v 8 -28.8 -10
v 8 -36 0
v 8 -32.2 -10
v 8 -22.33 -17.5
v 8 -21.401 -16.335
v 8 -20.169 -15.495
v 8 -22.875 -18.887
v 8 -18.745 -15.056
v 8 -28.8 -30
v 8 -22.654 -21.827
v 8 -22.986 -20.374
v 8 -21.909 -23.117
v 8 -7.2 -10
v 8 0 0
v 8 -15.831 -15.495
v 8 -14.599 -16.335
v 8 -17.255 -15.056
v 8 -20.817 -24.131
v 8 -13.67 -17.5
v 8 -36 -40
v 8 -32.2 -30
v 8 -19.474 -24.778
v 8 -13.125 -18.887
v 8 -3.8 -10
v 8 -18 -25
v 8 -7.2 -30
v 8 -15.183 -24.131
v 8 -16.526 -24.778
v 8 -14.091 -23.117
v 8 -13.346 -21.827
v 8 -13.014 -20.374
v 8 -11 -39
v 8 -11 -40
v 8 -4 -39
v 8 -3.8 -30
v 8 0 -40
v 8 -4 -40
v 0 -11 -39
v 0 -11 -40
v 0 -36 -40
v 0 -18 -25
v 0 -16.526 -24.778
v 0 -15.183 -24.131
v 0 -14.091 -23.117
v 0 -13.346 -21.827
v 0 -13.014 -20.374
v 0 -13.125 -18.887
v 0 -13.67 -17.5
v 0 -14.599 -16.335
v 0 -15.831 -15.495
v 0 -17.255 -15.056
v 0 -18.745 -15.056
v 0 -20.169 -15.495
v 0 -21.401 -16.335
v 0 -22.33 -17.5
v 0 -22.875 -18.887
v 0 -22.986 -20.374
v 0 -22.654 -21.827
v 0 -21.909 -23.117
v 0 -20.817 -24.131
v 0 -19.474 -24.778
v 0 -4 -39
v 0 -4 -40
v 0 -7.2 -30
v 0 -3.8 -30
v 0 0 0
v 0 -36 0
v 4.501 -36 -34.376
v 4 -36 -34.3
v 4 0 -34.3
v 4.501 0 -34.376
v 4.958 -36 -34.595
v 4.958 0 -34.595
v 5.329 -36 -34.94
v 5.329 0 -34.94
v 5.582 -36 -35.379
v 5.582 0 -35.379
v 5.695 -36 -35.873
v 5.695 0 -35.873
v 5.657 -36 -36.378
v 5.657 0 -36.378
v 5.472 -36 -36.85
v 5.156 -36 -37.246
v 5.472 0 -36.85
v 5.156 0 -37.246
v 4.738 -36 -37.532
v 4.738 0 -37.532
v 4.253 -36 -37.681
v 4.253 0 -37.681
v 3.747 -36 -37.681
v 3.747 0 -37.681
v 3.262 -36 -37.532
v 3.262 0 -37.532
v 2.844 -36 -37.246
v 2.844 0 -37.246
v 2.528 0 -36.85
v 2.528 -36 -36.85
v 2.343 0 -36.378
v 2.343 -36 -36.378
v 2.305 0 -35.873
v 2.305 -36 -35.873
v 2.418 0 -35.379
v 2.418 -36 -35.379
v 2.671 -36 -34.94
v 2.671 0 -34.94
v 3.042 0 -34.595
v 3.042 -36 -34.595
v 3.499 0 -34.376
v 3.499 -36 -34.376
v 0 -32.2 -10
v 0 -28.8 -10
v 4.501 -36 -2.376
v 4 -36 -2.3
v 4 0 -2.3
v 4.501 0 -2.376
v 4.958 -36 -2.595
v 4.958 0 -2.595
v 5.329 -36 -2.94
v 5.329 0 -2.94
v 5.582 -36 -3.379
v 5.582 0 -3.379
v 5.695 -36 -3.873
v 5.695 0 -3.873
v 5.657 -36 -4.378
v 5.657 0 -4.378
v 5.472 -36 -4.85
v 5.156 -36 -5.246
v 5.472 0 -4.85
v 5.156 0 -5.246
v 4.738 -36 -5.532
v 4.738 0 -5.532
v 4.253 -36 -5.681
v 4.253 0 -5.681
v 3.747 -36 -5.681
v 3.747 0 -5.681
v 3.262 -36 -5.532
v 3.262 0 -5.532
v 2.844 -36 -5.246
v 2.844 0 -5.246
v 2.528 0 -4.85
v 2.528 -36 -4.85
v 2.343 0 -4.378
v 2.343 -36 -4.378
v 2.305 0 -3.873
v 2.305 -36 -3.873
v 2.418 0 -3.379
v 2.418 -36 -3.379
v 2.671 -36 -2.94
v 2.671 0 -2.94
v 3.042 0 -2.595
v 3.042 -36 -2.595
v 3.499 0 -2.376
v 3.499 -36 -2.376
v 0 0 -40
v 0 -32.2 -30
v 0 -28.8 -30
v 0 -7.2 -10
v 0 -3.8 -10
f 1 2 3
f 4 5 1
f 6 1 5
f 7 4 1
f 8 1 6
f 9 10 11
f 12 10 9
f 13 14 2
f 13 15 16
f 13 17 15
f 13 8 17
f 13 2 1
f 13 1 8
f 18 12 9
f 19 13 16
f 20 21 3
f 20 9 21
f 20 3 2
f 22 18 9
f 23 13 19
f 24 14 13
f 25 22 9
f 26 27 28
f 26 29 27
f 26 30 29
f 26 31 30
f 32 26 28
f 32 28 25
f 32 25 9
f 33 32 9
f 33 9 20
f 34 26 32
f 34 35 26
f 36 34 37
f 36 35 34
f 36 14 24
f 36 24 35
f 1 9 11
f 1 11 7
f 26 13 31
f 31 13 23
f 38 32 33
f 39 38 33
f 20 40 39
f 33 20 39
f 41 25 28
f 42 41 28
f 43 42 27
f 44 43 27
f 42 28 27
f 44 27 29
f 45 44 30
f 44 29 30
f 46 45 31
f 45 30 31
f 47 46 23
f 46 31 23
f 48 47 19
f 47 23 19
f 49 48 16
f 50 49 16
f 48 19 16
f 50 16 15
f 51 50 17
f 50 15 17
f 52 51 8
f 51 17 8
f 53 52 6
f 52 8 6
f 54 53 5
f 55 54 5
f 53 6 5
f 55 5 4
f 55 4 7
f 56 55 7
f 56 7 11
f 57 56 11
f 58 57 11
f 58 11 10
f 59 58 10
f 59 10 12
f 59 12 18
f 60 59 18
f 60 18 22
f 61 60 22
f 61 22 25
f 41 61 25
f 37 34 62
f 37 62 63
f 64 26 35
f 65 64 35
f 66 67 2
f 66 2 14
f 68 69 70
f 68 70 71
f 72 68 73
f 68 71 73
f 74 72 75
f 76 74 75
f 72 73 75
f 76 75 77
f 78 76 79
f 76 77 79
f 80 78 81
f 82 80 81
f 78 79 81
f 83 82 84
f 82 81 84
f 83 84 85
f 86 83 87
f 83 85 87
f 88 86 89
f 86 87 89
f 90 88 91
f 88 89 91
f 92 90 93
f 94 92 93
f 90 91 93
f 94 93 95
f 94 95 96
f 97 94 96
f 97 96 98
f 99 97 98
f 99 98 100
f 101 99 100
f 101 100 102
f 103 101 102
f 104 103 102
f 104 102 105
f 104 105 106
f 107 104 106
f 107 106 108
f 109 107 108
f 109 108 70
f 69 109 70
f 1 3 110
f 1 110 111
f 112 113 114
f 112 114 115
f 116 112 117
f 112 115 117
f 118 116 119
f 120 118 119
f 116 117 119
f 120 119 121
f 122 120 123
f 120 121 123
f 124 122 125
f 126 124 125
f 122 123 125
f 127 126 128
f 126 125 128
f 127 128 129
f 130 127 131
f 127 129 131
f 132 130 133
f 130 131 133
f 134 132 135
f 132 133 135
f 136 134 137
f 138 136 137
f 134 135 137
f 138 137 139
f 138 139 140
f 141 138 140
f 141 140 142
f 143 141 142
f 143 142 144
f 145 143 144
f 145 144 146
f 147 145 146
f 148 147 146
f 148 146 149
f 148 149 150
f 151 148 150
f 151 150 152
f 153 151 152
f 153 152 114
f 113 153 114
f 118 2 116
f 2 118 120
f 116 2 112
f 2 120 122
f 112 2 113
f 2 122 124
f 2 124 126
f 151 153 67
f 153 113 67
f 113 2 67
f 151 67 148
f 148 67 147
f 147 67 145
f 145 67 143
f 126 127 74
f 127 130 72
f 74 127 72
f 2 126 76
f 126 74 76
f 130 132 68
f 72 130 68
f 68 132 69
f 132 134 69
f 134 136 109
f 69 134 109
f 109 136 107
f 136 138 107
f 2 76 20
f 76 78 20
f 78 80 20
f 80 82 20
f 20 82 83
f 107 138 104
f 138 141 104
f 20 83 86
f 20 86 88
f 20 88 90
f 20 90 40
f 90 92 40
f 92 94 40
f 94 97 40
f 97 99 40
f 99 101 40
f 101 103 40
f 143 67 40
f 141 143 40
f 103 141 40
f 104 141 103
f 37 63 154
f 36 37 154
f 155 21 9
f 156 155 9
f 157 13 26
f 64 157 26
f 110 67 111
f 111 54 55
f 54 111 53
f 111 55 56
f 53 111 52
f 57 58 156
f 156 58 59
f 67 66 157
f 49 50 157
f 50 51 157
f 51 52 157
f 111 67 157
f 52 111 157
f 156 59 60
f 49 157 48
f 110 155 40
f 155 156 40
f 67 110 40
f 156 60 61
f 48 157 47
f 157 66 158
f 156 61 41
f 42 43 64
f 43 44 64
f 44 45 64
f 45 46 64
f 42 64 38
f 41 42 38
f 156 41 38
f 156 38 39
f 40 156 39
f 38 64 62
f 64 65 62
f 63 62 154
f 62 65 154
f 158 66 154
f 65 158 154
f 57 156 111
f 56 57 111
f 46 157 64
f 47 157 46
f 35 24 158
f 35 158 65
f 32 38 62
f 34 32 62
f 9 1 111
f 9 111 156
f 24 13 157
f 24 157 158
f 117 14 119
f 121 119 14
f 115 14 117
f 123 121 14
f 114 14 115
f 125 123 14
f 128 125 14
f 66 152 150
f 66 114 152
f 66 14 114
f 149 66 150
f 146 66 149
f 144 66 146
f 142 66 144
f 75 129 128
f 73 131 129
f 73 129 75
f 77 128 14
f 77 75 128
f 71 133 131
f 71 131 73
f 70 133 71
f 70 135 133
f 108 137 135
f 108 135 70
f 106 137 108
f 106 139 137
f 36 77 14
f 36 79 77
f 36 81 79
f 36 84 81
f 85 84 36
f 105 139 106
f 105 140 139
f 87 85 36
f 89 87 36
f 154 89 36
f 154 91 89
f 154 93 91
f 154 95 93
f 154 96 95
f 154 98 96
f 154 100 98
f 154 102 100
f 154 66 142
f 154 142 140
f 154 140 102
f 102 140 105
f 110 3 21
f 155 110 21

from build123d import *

# Parameters (mm, degrees)
SKETCH1_W           = 40
SKETCH1_H           = 36
BOSS_EXTRUDE1_DEPTH = 8
SKETCH2_R           = 5
CUT_EXTRUDE1_DEPTH  = 55.405882035
SKETCH3_W           = 20
SKETCH3_H           = 3.4
CUT_EXTRUDE2_DEPTH  = 55.405882035
SKETCH6_R           = 1.7
CUT_EXTRUDE3_DEPTH  = 55.405882035
SKETCH7_W           = 1
SKETCH7_H           = 7
CUT_EXTRUDE4_DEPTH  = 55.405882035


with BuildPart() as part:
    # Sketch1 → Boss-Extrude1 (new body)
    with BuildSketch(Plane(origin=(0, 0, 0), x_dir=(0, 0, -1), z_dir=(1, 0, 0))):
        with Locations((20, -18)):
            Rectangle(SKETCH1_W, SKETCH1_H)
    extrude(amount=BOSS_EXTRUDE1_DEPTH)

    # Sketch2 → Cut-Extrude1 (cut, through all)
    with BuildSketch(Plane(origin=(8, 0, 0), x_dir=(0, 0, -1), z_dir=(1, 0, 0))):
        with Locations((20, -18)):
            Circle(SKETCH2_R)
    extrude(amount=-CUT_EXTRUDE1_DEPTH, mode=Mode.SUBTRACT)

    # Sketch3 → Cut-Extrude2 (cut, through all)
    with BuildSketch(Plane(origin=(8, 0, 0), x_dir=(0, 0, -1), z_dir=(1, 0, 0))):
        with Locations((20, -5.5)):
            Rectangle(SKETCH3_W, SKETCH3_H)
        with Locations((20, -30.5)):
            Rectangle(SKETCH3_W, SKETCH3_H)
    extrude(amount=-CUT_EXTRUDE2_DEPTH, mode=Mode.SUBTRACT)

    # Sketch6 → Cut-Extrude3 (cut, through all)
    with BuildSketch(Plane(origin=(0, 0, 0), x_dir=(1, 0, 0), z_dir=(0, 1, 0))):
        with Locations(Location((4, 4, 0), (0, 0, 270))):
            Circle(SKETCH6_R)
        with Locations(Location((4, 36, 0), (0, 0, 270))):
            Circle(SKETCH6_R)
    extrude(amount=-CUT_EXTRUDE3_DEPTH, mode=Mode.SUBTRACT)

    # Sketch7 → Cut-Extrude4 (cut, through all)
    with BuildSketch(Plane(origin=(8, 0, 0), x_dir=(0, 0, -1), z_dir=(1, 0, 0))):
        with Locations((39.5, -7.5)):
            Rectangle(SKETCH7_W, SKETCH7_H)
    extrude(amount=-CUT_EXTRUDE4_DEPTH, mode=Mode.SUBTRACT)


solid = part.part
